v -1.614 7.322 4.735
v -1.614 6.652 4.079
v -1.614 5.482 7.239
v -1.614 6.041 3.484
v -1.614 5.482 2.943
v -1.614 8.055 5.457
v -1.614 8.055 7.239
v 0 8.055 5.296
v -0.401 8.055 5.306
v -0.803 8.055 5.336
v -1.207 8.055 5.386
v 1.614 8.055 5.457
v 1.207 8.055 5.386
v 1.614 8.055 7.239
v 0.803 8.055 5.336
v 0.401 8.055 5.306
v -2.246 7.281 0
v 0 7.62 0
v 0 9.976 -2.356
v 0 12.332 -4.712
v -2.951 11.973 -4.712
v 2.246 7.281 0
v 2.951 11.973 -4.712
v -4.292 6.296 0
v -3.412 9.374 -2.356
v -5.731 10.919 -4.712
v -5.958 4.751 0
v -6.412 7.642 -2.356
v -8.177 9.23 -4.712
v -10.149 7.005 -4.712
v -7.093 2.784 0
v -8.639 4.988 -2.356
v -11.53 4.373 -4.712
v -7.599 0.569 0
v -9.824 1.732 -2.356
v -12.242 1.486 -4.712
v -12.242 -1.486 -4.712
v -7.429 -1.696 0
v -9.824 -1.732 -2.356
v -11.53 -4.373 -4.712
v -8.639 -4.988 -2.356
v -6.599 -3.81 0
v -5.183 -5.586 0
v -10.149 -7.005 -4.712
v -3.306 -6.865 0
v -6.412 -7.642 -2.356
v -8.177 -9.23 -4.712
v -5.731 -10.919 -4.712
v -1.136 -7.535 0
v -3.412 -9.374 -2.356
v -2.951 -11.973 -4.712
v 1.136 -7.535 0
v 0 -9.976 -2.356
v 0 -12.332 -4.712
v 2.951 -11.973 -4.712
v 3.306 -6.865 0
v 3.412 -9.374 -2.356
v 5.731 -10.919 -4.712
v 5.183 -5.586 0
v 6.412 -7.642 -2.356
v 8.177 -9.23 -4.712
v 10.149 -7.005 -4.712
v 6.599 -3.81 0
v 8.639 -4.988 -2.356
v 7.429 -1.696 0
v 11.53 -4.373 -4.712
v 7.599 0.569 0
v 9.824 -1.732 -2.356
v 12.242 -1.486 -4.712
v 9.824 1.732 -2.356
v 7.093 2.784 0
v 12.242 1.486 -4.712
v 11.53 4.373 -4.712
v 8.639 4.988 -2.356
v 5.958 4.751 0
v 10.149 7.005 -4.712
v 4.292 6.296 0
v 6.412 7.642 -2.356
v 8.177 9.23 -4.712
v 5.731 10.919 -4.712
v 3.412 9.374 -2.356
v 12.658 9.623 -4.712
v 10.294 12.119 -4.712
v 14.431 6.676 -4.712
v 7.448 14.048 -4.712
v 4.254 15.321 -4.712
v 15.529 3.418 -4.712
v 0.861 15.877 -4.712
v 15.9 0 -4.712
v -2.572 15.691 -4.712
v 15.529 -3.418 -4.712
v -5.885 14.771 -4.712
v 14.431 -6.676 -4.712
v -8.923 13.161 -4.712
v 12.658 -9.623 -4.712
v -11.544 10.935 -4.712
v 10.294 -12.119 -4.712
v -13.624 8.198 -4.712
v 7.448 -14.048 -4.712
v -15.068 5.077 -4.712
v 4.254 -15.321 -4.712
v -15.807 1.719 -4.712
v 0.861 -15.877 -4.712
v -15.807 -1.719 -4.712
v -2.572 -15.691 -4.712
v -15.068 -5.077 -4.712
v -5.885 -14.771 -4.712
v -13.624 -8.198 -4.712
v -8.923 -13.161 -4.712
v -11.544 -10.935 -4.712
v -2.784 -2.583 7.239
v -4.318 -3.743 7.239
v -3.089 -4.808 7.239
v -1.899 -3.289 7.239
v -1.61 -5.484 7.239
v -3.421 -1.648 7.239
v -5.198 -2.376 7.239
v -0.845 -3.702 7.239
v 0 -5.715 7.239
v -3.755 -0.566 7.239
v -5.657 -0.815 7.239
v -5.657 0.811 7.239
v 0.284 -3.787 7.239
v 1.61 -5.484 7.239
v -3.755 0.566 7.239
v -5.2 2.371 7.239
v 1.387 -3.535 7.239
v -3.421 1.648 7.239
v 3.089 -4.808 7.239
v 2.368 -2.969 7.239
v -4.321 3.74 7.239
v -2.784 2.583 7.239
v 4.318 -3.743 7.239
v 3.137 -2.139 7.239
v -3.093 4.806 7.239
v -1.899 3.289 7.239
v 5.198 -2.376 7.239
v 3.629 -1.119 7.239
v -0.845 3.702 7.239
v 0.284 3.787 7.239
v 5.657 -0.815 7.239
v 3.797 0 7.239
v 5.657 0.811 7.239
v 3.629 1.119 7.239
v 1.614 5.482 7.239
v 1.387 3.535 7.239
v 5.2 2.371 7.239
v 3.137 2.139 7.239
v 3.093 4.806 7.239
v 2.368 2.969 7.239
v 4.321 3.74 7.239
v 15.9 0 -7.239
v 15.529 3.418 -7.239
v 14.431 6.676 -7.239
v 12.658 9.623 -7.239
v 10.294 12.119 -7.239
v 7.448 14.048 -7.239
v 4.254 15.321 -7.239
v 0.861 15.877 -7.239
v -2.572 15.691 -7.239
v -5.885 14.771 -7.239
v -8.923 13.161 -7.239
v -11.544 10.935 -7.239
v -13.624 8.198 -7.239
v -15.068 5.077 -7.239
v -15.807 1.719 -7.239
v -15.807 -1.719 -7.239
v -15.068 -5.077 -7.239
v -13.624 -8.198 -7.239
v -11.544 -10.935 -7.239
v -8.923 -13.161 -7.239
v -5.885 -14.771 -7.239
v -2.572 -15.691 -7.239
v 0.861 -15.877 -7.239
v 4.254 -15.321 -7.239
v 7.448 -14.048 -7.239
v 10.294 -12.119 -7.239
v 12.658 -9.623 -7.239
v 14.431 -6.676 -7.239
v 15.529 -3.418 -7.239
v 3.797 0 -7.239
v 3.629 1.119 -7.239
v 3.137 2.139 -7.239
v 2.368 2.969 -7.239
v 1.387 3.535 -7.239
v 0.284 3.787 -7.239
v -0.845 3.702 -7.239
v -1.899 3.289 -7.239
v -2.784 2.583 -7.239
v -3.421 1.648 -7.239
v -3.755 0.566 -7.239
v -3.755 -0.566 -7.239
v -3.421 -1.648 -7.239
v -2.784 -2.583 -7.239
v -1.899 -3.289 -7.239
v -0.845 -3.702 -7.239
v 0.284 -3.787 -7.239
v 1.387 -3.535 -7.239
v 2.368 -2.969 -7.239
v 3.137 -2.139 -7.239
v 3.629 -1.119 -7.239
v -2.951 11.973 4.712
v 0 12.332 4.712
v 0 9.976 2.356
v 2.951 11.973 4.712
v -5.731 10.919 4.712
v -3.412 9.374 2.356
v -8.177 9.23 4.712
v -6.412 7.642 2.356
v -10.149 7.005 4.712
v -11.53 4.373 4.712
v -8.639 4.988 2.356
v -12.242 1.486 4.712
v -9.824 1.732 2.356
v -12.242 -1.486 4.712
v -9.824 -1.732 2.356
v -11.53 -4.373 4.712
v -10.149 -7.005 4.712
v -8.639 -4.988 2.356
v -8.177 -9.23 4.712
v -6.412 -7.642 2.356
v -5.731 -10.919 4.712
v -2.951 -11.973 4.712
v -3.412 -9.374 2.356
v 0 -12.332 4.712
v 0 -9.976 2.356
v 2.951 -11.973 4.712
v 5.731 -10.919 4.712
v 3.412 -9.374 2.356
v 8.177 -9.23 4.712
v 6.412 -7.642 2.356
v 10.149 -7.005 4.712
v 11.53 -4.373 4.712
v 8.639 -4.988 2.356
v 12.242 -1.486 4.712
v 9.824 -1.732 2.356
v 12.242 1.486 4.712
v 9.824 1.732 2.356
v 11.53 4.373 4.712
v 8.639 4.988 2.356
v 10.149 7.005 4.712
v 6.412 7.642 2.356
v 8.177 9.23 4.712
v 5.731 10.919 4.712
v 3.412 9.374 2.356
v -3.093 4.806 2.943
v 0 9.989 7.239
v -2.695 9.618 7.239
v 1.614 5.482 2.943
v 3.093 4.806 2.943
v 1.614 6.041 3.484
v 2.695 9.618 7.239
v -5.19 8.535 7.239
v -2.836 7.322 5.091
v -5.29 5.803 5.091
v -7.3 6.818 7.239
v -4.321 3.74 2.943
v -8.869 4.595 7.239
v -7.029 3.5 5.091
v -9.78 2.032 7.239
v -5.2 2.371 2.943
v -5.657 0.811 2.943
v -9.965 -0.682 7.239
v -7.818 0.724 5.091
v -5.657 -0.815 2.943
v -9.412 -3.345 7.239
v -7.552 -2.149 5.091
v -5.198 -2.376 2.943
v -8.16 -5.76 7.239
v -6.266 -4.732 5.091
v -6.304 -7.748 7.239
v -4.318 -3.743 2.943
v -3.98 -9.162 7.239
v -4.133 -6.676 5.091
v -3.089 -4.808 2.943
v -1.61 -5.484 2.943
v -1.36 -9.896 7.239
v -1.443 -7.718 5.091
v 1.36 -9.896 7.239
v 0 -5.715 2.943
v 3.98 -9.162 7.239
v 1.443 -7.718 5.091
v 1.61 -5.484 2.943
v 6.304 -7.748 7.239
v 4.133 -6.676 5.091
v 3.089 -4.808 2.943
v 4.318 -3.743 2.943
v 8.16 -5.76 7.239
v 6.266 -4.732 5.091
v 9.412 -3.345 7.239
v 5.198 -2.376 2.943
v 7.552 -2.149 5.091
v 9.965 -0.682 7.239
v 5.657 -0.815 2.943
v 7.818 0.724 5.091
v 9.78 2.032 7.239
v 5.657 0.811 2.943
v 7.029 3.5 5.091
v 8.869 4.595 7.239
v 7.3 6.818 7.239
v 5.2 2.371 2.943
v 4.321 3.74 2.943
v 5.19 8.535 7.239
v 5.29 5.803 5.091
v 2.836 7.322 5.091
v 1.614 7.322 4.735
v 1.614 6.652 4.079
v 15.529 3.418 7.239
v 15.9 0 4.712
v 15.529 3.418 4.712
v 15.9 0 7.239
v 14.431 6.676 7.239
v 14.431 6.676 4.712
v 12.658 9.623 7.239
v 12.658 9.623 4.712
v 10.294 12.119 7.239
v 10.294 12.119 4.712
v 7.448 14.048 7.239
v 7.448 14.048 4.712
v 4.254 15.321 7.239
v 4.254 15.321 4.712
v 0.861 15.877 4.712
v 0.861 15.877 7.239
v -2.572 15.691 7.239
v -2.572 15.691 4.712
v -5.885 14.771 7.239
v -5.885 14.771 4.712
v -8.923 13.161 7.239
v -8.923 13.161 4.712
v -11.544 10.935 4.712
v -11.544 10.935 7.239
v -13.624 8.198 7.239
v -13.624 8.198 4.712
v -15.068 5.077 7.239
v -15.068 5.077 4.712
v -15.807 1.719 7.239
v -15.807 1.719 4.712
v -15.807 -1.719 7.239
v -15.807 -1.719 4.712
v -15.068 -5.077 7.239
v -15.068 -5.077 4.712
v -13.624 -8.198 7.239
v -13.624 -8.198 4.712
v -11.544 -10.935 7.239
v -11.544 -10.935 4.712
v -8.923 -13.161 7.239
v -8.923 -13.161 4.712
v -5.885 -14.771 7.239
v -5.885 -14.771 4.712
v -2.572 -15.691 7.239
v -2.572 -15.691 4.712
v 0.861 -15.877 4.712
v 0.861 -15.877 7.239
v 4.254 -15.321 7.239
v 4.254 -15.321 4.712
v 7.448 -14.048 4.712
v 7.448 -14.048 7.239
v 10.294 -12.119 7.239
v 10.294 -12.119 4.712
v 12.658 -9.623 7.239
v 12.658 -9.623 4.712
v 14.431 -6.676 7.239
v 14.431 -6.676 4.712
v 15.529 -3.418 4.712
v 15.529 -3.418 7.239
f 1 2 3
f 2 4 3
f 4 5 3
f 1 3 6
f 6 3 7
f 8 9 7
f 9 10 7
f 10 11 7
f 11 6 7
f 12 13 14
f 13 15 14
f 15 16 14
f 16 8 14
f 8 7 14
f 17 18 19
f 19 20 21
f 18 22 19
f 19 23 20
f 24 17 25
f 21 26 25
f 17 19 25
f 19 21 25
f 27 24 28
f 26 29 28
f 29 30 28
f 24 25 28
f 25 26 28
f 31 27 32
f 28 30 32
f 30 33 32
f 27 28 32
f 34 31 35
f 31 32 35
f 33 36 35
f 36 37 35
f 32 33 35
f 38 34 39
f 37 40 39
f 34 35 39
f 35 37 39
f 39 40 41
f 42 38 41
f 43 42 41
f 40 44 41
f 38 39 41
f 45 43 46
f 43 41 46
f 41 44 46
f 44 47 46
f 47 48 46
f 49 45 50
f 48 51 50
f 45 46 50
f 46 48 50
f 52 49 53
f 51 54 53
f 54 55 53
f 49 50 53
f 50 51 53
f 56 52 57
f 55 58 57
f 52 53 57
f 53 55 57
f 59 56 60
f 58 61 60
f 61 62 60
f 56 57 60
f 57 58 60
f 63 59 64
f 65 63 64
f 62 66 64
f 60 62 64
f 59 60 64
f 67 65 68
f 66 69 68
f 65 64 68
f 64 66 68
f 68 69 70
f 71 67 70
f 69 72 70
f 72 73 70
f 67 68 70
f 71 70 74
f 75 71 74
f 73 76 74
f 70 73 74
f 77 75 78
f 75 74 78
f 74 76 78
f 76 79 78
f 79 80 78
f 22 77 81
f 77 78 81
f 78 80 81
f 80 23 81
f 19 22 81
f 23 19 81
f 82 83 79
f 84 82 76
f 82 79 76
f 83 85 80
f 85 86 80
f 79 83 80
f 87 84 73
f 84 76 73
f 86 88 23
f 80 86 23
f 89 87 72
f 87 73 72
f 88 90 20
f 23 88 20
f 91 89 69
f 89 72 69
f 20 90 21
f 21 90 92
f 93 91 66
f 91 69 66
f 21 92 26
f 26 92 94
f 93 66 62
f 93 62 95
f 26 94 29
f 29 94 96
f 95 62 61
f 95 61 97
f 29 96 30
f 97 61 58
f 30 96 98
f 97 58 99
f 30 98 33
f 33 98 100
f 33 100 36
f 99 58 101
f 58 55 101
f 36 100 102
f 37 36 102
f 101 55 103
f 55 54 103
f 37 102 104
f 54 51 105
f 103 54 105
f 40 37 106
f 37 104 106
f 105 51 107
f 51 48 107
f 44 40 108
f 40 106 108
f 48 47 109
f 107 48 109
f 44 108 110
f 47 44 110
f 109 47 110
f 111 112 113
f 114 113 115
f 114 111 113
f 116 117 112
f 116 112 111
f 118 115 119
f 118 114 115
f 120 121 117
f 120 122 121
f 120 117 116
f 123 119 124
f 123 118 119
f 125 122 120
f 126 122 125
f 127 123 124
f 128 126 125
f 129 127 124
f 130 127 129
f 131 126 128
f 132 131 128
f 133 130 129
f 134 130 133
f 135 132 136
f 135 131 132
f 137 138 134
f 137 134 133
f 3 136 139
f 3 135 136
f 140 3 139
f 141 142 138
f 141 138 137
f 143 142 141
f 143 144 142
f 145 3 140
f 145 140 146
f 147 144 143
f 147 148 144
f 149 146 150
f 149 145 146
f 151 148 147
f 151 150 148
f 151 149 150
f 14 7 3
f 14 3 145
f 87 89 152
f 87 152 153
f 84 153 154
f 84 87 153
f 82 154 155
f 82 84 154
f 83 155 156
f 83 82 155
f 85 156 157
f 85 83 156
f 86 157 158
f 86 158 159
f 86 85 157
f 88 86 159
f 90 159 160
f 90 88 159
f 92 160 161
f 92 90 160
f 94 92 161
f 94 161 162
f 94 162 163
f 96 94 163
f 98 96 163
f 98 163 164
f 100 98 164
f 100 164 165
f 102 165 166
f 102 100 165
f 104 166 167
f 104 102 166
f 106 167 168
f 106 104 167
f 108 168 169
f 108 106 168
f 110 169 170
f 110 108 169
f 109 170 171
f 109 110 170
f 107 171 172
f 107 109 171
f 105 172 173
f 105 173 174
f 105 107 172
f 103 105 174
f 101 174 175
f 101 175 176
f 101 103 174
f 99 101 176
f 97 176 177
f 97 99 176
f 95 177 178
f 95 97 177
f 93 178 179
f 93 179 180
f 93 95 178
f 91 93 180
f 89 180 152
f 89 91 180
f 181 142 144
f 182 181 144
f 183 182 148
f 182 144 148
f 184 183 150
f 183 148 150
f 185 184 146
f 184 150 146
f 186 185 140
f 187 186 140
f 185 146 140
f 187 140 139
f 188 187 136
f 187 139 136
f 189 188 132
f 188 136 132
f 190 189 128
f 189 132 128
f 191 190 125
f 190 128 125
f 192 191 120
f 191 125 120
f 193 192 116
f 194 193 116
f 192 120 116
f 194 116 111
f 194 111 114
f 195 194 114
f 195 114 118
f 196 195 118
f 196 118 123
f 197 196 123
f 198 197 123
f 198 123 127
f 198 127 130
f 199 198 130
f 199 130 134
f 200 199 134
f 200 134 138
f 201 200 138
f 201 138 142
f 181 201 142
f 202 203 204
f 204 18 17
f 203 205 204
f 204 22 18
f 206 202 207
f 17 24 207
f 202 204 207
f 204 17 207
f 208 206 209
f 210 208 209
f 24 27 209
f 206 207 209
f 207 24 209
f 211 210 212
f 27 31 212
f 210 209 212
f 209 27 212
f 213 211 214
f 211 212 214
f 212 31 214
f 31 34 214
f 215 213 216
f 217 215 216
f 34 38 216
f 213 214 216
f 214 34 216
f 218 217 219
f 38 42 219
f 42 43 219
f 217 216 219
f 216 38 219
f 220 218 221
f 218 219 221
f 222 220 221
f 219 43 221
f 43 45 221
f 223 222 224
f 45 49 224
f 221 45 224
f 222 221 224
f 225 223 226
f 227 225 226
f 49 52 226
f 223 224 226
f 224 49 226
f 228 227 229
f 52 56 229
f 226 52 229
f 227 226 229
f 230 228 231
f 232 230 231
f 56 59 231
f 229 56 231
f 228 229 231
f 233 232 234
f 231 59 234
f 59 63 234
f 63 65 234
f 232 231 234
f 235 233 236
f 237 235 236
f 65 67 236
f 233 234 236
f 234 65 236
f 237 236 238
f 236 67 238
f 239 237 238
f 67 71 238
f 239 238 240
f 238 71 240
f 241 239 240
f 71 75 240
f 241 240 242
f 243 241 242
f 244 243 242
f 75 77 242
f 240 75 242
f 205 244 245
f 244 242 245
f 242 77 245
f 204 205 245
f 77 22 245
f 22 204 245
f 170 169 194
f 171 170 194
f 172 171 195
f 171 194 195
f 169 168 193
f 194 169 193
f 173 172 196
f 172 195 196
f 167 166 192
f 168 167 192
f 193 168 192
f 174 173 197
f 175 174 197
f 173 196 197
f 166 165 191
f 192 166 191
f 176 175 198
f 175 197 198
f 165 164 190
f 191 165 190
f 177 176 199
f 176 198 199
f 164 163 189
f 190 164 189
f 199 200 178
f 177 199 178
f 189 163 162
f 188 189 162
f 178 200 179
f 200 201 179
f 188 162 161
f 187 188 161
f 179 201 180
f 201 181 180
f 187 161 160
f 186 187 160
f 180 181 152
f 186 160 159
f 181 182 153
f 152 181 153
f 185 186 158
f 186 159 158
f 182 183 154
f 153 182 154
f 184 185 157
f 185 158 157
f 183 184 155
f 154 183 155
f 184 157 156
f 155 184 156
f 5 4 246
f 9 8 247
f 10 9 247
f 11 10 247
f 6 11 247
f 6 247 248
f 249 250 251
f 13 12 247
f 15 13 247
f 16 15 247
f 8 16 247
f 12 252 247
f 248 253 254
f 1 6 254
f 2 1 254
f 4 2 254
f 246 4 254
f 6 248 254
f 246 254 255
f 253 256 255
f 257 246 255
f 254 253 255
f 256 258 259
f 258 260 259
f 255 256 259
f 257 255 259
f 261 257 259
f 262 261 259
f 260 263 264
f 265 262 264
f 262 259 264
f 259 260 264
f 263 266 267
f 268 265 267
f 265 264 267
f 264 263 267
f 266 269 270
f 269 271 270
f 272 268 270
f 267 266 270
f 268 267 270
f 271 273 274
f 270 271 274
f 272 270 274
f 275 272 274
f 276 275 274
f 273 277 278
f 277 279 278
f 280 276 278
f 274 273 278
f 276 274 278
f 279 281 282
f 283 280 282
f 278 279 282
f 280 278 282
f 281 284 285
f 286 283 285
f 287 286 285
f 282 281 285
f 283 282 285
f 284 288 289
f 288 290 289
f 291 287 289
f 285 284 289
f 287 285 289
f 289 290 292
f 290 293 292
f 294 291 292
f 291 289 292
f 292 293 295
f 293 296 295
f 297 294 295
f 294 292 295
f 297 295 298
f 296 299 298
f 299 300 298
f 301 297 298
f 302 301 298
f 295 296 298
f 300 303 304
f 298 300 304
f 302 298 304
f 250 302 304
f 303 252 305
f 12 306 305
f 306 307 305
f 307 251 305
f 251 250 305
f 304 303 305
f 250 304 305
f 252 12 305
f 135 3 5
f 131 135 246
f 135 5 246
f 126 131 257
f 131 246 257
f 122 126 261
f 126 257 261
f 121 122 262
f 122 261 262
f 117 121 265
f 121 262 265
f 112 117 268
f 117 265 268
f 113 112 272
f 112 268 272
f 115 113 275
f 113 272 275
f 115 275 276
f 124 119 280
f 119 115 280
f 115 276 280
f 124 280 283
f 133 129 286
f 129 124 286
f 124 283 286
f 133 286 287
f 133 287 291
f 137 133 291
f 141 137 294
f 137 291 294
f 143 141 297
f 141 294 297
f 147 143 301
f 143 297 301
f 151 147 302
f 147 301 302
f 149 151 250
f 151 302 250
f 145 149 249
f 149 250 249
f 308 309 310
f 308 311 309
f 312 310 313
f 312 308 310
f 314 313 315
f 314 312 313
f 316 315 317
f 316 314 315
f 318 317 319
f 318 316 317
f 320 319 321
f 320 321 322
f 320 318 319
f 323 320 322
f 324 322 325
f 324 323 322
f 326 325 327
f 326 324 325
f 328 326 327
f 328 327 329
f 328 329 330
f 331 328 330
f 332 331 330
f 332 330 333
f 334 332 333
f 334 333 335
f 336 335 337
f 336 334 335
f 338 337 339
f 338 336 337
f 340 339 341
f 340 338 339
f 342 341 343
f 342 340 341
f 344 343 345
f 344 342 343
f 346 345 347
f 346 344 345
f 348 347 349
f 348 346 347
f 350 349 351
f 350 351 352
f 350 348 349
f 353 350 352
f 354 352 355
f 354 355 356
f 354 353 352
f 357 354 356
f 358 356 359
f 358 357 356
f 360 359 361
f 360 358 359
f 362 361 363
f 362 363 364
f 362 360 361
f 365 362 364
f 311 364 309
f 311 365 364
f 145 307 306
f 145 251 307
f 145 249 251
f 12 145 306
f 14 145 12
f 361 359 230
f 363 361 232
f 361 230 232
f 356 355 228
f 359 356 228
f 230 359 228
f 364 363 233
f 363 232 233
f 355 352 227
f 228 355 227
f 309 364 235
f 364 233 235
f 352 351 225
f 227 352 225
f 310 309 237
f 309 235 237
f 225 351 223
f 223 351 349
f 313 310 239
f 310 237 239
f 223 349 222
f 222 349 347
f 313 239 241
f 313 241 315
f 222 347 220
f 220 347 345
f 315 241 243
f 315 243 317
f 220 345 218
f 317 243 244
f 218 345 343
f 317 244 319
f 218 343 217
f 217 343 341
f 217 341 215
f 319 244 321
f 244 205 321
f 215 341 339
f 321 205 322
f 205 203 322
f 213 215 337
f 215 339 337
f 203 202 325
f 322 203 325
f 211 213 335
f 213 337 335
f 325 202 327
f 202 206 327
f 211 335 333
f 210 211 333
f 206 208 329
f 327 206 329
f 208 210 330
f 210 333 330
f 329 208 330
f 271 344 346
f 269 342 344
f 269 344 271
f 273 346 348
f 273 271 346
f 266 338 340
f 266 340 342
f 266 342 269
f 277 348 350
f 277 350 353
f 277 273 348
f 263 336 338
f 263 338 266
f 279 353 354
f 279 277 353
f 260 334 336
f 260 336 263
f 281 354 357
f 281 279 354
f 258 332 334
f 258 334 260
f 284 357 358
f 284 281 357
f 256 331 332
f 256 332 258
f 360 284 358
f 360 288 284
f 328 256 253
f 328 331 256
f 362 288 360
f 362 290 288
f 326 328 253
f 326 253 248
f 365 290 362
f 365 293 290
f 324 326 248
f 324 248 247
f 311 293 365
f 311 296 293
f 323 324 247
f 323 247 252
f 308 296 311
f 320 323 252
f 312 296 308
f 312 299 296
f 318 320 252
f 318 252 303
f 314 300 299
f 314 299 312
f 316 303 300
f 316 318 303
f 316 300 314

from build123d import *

# Parameters (mm, degrees)
F0_R     = 15.9004
F1_DEPTH = 7.239
F2_R     = 3.7973
F3_DEPTH = 14.479
F6_W     = 3.2282739412
F6_H     = 3.175


with BuildPart() as f1:
    # F0 (on Top) → F1 (new body, symmetric)
    with BuildSketch(Plane.XY):
        Circle(F0_R)
    extrude(amount=F1_DEPTH, both=True)

    # F2 (on face) → F3 (cut, through all)
    with BuildSketch(Plane.XY.offset(7.239)):
        Circle(F2_R)
    extrude(amount=-F3_DEPTH, mode=Mode.SUBTRACT)

    # F4 (on Right) → F5 (revolve, cut)
    with BuildSketch(Plane.YZ):
        Polygon((21.4757, -4.7117), (21.4757, 4.7117), (12.3317, 4.7117), (7.62, 0), (12.3317, -4.7117), align=None)
        Polygon((12.0194002201, 9.2803370403), (5.715, 9.2803370403), (5.715, 2.9428403359), align=None)
    revolve(axis=Axis((0, 0, 7.4247815646), (0, 0, 1)), mode=Mode.SUBTRACT)

    # F6 (on face) → F7 (join, up to the next surface of F1)
    with BuildSketch(Plane.XY.offset(7.239)):
        with Locations((0, 6.4679230563)):
            Rectangle(F6_W, F6_H)
    extrude(until=Until.NEXT, dir=(0, 0, -1))


solid = f1.part
